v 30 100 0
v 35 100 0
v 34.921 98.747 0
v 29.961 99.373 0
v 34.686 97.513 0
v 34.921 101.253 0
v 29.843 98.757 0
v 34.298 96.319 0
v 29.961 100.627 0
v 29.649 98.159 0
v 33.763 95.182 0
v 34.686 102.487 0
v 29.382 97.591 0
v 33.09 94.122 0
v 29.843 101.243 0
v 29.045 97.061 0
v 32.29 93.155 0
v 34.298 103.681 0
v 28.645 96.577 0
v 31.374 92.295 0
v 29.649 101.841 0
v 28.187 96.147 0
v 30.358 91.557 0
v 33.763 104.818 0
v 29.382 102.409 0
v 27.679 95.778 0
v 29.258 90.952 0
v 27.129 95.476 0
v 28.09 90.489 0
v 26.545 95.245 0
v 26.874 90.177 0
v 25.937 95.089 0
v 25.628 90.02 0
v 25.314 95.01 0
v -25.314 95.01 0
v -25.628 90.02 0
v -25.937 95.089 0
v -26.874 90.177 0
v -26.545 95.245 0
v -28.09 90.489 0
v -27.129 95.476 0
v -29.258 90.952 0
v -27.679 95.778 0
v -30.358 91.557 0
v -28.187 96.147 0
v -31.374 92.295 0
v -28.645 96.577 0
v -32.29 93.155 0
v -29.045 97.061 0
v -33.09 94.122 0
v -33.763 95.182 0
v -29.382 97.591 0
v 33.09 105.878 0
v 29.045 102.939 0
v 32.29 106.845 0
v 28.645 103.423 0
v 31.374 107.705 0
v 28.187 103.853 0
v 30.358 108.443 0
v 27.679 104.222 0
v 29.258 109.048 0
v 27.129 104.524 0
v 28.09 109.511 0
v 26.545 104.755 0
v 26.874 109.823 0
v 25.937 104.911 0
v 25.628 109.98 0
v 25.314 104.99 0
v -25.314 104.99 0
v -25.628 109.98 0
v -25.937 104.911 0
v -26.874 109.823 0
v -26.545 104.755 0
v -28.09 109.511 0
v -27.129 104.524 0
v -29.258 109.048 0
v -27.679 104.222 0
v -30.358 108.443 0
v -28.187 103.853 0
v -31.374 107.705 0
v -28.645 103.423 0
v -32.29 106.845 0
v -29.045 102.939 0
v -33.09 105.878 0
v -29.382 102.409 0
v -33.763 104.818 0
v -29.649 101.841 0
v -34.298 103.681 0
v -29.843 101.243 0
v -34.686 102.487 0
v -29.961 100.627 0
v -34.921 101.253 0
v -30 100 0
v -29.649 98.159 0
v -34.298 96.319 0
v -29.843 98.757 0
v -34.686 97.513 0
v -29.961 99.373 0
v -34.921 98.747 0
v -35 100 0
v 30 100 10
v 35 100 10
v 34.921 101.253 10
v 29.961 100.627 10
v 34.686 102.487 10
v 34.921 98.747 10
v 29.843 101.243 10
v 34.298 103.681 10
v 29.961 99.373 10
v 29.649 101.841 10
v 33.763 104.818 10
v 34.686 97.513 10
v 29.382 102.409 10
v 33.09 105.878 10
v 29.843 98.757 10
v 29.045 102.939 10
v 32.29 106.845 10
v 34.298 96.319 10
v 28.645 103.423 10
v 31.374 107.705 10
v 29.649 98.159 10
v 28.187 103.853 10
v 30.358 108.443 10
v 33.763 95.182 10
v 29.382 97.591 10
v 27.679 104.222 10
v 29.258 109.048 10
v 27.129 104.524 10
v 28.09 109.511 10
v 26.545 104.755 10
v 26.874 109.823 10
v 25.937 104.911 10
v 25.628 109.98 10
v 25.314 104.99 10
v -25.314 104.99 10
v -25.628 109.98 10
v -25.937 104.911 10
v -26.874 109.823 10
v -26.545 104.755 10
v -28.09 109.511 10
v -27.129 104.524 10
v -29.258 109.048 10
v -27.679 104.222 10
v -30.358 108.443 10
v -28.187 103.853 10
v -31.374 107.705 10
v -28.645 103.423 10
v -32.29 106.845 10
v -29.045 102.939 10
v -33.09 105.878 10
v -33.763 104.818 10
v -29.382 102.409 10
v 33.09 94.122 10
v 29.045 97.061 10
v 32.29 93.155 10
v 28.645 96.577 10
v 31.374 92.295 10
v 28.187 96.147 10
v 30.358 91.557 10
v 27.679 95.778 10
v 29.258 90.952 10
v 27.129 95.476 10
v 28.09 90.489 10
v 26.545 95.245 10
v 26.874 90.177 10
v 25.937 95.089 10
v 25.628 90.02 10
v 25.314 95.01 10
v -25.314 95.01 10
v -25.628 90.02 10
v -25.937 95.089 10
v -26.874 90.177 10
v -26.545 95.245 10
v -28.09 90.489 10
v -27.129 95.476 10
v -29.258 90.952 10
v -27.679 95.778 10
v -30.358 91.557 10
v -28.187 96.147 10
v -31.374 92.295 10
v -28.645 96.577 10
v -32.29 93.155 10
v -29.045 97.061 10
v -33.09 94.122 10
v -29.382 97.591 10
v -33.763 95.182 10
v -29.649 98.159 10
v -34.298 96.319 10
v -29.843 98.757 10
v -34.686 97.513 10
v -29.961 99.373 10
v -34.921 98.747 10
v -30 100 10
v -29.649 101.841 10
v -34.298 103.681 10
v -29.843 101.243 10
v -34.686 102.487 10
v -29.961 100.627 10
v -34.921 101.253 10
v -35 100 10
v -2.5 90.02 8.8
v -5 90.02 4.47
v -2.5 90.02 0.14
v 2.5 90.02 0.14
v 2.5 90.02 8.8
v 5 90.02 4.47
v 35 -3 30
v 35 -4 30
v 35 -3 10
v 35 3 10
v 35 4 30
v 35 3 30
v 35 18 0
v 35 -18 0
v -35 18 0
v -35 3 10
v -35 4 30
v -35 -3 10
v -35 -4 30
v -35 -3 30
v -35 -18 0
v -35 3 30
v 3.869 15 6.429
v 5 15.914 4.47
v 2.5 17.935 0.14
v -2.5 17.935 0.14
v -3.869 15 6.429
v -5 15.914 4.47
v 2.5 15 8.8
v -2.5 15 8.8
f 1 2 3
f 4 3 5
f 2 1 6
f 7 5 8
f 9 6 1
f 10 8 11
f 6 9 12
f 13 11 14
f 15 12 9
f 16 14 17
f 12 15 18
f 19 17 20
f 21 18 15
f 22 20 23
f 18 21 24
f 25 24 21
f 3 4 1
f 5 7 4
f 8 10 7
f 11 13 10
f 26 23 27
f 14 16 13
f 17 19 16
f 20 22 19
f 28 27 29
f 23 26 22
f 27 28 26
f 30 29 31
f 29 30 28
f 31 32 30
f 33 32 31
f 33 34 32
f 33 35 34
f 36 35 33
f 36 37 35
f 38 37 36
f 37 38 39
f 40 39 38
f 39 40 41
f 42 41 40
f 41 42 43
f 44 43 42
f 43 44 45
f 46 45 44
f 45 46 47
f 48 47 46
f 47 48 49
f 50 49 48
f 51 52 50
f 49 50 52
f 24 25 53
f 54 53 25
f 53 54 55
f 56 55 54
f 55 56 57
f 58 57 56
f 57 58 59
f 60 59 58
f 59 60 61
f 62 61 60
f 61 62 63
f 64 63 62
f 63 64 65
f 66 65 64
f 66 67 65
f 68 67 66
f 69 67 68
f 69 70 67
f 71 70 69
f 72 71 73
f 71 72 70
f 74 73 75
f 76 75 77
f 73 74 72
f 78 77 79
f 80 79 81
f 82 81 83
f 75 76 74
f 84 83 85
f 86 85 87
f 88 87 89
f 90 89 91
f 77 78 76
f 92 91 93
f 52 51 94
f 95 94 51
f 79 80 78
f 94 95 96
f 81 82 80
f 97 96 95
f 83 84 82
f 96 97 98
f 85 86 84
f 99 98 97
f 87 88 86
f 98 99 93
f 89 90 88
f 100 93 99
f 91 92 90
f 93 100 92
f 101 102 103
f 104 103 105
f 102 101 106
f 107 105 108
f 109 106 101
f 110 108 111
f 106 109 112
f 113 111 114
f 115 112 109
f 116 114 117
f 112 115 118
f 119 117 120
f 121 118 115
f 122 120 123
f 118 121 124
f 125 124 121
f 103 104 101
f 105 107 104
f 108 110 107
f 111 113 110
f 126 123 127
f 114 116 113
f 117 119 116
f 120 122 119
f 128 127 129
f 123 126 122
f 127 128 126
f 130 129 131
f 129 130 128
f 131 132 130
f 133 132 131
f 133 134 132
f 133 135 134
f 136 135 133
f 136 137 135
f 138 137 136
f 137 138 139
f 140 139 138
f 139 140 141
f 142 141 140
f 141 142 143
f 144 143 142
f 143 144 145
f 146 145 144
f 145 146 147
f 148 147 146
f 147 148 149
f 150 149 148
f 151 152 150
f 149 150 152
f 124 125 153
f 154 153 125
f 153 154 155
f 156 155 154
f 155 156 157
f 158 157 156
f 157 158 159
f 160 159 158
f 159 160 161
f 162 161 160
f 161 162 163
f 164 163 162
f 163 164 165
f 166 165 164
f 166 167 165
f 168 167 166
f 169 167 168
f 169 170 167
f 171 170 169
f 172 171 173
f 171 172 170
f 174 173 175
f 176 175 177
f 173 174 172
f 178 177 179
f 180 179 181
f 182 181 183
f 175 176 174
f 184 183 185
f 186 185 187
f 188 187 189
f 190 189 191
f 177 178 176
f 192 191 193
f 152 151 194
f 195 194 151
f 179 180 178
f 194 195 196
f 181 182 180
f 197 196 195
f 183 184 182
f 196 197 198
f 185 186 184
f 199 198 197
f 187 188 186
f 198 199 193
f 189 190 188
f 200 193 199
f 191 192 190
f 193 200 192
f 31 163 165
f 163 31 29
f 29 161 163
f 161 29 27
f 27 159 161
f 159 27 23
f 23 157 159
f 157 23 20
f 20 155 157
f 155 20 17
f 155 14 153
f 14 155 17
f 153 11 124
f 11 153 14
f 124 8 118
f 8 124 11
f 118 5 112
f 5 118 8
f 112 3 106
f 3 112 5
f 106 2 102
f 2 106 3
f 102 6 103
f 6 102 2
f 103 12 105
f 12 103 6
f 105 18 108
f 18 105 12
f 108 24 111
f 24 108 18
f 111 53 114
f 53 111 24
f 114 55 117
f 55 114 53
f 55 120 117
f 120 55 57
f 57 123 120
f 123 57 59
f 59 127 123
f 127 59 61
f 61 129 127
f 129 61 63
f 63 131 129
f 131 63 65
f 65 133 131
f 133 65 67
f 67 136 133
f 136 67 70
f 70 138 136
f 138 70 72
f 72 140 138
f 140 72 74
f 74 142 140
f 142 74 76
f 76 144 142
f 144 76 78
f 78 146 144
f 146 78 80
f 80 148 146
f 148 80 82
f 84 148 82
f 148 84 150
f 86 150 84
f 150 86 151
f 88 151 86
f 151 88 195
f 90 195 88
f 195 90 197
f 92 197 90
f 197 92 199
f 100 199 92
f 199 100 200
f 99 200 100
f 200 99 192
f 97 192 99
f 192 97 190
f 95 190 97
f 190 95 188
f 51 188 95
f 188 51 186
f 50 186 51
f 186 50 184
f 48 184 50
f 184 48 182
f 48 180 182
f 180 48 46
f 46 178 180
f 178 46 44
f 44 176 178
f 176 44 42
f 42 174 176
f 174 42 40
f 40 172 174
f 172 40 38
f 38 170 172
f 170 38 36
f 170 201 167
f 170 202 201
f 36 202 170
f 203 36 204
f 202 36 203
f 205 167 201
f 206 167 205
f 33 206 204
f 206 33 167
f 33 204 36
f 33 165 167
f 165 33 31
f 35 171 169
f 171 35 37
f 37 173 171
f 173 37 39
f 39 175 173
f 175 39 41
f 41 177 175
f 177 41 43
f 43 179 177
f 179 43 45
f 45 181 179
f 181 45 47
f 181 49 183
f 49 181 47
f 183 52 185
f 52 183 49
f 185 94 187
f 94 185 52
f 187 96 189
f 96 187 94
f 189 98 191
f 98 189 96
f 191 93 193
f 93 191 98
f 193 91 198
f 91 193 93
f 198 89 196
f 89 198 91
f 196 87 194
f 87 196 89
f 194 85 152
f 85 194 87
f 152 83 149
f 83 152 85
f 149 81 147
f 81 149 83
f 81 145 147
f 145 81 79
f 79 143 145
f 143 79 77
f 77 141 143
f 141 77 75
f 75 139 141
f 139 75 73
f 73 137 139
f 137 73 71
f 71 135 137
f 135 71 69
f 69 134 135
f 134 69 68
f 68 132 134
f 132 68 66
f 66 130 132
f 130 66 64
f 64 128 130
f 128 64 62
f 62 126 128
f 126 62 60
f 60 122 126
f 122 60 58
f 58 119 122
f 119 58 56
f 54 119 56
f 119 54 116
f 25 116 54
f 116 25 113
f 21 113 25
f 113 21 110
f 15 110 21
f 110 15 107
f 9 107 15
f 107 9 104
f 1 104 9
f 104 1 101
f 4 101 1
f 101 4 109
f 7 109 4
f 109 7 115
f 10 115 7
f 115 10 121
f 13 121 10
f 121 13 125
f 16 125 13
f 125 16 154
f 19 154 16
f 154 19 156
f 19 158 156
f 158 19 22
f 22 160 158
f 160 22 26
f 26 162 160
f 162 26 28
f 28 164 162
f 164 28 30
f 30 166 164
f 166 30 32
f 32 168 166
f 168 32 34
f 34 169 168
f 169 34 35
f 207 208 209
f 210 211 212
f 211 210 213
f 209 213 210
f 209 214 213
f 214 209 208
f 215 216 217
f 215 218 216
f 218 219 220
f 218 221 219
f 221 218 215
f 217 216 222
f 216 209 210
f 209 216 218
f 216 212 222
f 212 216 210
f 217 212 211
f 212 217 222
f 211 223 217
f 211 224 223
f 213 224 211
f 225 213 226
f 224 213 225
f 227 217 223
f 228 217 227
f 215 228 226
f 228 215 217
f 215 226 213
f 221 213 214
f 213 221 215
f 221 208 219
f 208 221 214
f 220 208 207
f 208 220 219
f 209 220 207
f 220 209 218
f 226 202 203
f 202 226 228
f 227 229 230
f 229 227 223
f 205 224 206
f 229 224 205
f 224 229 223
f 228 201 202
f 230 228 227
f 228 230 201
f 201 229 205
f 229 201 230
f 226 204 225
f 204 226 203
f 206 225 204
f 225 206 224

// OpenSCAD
// length of frame clamp
frameClampLength = 70;

// distance between printer frame and filament guide
guideDistance = 80;

// frame thickness
frameThickness = 6;

// height of frame clamp
frameClampHeight = 30;

// width of frame clamp 
frameClampWidth = 20;

// width of clamp
clampWidth = 10;

// width of guide
guideWidth = 10;

// height of guide
guideHeight = 50;

// thickness of guide
guideThickness = 10;

// quality
$fn = 50;

module clamp() {
  translate ([frameClampLength/2,0,clampWidth])
  rotate ([270,0,90])
  linear_extrude (height=frameClampLength)
  polygon (points=[[-frameThickness/2, 0], [frameThickness/2,0], [frameThickness/2, -frameClampWidth], [frameThickness/2+1, -frameClampWidth], [frameThickness/2+frameClampHeight/2, clampWidth], [-frameThickness/2-frameClampHeight/2, clampWidth], [-frameThickness/2-1, -frameClampWidth], [-frameThickness/2, -frameClampWidth]]);  
  
}

module guideHolder() {
  translate ([0,frameClampHeight/2,guideThickness/2-0.53])
  rotate ([270,0,0])
  linear_extrude (height=guideDistance)
  circle (d=guideThickness, $fn=6);
  /*
  translate ([0,frameClampHeight/2+guideDistance/2,guideThickness/2])
  cube ([10, guideDistance, guideThickness],center=true);*/
}

module guide() {
  linear_extrude (height=guideThickness)
  difference() {
    hull() {
      translate ([-guideHeight/2,0]) circle (d=guideWidth+guideThickness);
      translate ([guideHeight/2,0]) circle (d=guideWidth+guideThickness);
    }
    hull() {
      translate ([-guideHeight/2,0]) circle (d=guideWidth);
      translate ([guideHeight/2,0]) circle (d=guideWidth);      
    }
  }
}

module filamentGuide() {
  union() {
    translate ([0,frameClampHeight/2+guideDistance+guideWidth/2,0]) guide();
    clamp();
    guideHolder();
  }
}

filamentGuide();
